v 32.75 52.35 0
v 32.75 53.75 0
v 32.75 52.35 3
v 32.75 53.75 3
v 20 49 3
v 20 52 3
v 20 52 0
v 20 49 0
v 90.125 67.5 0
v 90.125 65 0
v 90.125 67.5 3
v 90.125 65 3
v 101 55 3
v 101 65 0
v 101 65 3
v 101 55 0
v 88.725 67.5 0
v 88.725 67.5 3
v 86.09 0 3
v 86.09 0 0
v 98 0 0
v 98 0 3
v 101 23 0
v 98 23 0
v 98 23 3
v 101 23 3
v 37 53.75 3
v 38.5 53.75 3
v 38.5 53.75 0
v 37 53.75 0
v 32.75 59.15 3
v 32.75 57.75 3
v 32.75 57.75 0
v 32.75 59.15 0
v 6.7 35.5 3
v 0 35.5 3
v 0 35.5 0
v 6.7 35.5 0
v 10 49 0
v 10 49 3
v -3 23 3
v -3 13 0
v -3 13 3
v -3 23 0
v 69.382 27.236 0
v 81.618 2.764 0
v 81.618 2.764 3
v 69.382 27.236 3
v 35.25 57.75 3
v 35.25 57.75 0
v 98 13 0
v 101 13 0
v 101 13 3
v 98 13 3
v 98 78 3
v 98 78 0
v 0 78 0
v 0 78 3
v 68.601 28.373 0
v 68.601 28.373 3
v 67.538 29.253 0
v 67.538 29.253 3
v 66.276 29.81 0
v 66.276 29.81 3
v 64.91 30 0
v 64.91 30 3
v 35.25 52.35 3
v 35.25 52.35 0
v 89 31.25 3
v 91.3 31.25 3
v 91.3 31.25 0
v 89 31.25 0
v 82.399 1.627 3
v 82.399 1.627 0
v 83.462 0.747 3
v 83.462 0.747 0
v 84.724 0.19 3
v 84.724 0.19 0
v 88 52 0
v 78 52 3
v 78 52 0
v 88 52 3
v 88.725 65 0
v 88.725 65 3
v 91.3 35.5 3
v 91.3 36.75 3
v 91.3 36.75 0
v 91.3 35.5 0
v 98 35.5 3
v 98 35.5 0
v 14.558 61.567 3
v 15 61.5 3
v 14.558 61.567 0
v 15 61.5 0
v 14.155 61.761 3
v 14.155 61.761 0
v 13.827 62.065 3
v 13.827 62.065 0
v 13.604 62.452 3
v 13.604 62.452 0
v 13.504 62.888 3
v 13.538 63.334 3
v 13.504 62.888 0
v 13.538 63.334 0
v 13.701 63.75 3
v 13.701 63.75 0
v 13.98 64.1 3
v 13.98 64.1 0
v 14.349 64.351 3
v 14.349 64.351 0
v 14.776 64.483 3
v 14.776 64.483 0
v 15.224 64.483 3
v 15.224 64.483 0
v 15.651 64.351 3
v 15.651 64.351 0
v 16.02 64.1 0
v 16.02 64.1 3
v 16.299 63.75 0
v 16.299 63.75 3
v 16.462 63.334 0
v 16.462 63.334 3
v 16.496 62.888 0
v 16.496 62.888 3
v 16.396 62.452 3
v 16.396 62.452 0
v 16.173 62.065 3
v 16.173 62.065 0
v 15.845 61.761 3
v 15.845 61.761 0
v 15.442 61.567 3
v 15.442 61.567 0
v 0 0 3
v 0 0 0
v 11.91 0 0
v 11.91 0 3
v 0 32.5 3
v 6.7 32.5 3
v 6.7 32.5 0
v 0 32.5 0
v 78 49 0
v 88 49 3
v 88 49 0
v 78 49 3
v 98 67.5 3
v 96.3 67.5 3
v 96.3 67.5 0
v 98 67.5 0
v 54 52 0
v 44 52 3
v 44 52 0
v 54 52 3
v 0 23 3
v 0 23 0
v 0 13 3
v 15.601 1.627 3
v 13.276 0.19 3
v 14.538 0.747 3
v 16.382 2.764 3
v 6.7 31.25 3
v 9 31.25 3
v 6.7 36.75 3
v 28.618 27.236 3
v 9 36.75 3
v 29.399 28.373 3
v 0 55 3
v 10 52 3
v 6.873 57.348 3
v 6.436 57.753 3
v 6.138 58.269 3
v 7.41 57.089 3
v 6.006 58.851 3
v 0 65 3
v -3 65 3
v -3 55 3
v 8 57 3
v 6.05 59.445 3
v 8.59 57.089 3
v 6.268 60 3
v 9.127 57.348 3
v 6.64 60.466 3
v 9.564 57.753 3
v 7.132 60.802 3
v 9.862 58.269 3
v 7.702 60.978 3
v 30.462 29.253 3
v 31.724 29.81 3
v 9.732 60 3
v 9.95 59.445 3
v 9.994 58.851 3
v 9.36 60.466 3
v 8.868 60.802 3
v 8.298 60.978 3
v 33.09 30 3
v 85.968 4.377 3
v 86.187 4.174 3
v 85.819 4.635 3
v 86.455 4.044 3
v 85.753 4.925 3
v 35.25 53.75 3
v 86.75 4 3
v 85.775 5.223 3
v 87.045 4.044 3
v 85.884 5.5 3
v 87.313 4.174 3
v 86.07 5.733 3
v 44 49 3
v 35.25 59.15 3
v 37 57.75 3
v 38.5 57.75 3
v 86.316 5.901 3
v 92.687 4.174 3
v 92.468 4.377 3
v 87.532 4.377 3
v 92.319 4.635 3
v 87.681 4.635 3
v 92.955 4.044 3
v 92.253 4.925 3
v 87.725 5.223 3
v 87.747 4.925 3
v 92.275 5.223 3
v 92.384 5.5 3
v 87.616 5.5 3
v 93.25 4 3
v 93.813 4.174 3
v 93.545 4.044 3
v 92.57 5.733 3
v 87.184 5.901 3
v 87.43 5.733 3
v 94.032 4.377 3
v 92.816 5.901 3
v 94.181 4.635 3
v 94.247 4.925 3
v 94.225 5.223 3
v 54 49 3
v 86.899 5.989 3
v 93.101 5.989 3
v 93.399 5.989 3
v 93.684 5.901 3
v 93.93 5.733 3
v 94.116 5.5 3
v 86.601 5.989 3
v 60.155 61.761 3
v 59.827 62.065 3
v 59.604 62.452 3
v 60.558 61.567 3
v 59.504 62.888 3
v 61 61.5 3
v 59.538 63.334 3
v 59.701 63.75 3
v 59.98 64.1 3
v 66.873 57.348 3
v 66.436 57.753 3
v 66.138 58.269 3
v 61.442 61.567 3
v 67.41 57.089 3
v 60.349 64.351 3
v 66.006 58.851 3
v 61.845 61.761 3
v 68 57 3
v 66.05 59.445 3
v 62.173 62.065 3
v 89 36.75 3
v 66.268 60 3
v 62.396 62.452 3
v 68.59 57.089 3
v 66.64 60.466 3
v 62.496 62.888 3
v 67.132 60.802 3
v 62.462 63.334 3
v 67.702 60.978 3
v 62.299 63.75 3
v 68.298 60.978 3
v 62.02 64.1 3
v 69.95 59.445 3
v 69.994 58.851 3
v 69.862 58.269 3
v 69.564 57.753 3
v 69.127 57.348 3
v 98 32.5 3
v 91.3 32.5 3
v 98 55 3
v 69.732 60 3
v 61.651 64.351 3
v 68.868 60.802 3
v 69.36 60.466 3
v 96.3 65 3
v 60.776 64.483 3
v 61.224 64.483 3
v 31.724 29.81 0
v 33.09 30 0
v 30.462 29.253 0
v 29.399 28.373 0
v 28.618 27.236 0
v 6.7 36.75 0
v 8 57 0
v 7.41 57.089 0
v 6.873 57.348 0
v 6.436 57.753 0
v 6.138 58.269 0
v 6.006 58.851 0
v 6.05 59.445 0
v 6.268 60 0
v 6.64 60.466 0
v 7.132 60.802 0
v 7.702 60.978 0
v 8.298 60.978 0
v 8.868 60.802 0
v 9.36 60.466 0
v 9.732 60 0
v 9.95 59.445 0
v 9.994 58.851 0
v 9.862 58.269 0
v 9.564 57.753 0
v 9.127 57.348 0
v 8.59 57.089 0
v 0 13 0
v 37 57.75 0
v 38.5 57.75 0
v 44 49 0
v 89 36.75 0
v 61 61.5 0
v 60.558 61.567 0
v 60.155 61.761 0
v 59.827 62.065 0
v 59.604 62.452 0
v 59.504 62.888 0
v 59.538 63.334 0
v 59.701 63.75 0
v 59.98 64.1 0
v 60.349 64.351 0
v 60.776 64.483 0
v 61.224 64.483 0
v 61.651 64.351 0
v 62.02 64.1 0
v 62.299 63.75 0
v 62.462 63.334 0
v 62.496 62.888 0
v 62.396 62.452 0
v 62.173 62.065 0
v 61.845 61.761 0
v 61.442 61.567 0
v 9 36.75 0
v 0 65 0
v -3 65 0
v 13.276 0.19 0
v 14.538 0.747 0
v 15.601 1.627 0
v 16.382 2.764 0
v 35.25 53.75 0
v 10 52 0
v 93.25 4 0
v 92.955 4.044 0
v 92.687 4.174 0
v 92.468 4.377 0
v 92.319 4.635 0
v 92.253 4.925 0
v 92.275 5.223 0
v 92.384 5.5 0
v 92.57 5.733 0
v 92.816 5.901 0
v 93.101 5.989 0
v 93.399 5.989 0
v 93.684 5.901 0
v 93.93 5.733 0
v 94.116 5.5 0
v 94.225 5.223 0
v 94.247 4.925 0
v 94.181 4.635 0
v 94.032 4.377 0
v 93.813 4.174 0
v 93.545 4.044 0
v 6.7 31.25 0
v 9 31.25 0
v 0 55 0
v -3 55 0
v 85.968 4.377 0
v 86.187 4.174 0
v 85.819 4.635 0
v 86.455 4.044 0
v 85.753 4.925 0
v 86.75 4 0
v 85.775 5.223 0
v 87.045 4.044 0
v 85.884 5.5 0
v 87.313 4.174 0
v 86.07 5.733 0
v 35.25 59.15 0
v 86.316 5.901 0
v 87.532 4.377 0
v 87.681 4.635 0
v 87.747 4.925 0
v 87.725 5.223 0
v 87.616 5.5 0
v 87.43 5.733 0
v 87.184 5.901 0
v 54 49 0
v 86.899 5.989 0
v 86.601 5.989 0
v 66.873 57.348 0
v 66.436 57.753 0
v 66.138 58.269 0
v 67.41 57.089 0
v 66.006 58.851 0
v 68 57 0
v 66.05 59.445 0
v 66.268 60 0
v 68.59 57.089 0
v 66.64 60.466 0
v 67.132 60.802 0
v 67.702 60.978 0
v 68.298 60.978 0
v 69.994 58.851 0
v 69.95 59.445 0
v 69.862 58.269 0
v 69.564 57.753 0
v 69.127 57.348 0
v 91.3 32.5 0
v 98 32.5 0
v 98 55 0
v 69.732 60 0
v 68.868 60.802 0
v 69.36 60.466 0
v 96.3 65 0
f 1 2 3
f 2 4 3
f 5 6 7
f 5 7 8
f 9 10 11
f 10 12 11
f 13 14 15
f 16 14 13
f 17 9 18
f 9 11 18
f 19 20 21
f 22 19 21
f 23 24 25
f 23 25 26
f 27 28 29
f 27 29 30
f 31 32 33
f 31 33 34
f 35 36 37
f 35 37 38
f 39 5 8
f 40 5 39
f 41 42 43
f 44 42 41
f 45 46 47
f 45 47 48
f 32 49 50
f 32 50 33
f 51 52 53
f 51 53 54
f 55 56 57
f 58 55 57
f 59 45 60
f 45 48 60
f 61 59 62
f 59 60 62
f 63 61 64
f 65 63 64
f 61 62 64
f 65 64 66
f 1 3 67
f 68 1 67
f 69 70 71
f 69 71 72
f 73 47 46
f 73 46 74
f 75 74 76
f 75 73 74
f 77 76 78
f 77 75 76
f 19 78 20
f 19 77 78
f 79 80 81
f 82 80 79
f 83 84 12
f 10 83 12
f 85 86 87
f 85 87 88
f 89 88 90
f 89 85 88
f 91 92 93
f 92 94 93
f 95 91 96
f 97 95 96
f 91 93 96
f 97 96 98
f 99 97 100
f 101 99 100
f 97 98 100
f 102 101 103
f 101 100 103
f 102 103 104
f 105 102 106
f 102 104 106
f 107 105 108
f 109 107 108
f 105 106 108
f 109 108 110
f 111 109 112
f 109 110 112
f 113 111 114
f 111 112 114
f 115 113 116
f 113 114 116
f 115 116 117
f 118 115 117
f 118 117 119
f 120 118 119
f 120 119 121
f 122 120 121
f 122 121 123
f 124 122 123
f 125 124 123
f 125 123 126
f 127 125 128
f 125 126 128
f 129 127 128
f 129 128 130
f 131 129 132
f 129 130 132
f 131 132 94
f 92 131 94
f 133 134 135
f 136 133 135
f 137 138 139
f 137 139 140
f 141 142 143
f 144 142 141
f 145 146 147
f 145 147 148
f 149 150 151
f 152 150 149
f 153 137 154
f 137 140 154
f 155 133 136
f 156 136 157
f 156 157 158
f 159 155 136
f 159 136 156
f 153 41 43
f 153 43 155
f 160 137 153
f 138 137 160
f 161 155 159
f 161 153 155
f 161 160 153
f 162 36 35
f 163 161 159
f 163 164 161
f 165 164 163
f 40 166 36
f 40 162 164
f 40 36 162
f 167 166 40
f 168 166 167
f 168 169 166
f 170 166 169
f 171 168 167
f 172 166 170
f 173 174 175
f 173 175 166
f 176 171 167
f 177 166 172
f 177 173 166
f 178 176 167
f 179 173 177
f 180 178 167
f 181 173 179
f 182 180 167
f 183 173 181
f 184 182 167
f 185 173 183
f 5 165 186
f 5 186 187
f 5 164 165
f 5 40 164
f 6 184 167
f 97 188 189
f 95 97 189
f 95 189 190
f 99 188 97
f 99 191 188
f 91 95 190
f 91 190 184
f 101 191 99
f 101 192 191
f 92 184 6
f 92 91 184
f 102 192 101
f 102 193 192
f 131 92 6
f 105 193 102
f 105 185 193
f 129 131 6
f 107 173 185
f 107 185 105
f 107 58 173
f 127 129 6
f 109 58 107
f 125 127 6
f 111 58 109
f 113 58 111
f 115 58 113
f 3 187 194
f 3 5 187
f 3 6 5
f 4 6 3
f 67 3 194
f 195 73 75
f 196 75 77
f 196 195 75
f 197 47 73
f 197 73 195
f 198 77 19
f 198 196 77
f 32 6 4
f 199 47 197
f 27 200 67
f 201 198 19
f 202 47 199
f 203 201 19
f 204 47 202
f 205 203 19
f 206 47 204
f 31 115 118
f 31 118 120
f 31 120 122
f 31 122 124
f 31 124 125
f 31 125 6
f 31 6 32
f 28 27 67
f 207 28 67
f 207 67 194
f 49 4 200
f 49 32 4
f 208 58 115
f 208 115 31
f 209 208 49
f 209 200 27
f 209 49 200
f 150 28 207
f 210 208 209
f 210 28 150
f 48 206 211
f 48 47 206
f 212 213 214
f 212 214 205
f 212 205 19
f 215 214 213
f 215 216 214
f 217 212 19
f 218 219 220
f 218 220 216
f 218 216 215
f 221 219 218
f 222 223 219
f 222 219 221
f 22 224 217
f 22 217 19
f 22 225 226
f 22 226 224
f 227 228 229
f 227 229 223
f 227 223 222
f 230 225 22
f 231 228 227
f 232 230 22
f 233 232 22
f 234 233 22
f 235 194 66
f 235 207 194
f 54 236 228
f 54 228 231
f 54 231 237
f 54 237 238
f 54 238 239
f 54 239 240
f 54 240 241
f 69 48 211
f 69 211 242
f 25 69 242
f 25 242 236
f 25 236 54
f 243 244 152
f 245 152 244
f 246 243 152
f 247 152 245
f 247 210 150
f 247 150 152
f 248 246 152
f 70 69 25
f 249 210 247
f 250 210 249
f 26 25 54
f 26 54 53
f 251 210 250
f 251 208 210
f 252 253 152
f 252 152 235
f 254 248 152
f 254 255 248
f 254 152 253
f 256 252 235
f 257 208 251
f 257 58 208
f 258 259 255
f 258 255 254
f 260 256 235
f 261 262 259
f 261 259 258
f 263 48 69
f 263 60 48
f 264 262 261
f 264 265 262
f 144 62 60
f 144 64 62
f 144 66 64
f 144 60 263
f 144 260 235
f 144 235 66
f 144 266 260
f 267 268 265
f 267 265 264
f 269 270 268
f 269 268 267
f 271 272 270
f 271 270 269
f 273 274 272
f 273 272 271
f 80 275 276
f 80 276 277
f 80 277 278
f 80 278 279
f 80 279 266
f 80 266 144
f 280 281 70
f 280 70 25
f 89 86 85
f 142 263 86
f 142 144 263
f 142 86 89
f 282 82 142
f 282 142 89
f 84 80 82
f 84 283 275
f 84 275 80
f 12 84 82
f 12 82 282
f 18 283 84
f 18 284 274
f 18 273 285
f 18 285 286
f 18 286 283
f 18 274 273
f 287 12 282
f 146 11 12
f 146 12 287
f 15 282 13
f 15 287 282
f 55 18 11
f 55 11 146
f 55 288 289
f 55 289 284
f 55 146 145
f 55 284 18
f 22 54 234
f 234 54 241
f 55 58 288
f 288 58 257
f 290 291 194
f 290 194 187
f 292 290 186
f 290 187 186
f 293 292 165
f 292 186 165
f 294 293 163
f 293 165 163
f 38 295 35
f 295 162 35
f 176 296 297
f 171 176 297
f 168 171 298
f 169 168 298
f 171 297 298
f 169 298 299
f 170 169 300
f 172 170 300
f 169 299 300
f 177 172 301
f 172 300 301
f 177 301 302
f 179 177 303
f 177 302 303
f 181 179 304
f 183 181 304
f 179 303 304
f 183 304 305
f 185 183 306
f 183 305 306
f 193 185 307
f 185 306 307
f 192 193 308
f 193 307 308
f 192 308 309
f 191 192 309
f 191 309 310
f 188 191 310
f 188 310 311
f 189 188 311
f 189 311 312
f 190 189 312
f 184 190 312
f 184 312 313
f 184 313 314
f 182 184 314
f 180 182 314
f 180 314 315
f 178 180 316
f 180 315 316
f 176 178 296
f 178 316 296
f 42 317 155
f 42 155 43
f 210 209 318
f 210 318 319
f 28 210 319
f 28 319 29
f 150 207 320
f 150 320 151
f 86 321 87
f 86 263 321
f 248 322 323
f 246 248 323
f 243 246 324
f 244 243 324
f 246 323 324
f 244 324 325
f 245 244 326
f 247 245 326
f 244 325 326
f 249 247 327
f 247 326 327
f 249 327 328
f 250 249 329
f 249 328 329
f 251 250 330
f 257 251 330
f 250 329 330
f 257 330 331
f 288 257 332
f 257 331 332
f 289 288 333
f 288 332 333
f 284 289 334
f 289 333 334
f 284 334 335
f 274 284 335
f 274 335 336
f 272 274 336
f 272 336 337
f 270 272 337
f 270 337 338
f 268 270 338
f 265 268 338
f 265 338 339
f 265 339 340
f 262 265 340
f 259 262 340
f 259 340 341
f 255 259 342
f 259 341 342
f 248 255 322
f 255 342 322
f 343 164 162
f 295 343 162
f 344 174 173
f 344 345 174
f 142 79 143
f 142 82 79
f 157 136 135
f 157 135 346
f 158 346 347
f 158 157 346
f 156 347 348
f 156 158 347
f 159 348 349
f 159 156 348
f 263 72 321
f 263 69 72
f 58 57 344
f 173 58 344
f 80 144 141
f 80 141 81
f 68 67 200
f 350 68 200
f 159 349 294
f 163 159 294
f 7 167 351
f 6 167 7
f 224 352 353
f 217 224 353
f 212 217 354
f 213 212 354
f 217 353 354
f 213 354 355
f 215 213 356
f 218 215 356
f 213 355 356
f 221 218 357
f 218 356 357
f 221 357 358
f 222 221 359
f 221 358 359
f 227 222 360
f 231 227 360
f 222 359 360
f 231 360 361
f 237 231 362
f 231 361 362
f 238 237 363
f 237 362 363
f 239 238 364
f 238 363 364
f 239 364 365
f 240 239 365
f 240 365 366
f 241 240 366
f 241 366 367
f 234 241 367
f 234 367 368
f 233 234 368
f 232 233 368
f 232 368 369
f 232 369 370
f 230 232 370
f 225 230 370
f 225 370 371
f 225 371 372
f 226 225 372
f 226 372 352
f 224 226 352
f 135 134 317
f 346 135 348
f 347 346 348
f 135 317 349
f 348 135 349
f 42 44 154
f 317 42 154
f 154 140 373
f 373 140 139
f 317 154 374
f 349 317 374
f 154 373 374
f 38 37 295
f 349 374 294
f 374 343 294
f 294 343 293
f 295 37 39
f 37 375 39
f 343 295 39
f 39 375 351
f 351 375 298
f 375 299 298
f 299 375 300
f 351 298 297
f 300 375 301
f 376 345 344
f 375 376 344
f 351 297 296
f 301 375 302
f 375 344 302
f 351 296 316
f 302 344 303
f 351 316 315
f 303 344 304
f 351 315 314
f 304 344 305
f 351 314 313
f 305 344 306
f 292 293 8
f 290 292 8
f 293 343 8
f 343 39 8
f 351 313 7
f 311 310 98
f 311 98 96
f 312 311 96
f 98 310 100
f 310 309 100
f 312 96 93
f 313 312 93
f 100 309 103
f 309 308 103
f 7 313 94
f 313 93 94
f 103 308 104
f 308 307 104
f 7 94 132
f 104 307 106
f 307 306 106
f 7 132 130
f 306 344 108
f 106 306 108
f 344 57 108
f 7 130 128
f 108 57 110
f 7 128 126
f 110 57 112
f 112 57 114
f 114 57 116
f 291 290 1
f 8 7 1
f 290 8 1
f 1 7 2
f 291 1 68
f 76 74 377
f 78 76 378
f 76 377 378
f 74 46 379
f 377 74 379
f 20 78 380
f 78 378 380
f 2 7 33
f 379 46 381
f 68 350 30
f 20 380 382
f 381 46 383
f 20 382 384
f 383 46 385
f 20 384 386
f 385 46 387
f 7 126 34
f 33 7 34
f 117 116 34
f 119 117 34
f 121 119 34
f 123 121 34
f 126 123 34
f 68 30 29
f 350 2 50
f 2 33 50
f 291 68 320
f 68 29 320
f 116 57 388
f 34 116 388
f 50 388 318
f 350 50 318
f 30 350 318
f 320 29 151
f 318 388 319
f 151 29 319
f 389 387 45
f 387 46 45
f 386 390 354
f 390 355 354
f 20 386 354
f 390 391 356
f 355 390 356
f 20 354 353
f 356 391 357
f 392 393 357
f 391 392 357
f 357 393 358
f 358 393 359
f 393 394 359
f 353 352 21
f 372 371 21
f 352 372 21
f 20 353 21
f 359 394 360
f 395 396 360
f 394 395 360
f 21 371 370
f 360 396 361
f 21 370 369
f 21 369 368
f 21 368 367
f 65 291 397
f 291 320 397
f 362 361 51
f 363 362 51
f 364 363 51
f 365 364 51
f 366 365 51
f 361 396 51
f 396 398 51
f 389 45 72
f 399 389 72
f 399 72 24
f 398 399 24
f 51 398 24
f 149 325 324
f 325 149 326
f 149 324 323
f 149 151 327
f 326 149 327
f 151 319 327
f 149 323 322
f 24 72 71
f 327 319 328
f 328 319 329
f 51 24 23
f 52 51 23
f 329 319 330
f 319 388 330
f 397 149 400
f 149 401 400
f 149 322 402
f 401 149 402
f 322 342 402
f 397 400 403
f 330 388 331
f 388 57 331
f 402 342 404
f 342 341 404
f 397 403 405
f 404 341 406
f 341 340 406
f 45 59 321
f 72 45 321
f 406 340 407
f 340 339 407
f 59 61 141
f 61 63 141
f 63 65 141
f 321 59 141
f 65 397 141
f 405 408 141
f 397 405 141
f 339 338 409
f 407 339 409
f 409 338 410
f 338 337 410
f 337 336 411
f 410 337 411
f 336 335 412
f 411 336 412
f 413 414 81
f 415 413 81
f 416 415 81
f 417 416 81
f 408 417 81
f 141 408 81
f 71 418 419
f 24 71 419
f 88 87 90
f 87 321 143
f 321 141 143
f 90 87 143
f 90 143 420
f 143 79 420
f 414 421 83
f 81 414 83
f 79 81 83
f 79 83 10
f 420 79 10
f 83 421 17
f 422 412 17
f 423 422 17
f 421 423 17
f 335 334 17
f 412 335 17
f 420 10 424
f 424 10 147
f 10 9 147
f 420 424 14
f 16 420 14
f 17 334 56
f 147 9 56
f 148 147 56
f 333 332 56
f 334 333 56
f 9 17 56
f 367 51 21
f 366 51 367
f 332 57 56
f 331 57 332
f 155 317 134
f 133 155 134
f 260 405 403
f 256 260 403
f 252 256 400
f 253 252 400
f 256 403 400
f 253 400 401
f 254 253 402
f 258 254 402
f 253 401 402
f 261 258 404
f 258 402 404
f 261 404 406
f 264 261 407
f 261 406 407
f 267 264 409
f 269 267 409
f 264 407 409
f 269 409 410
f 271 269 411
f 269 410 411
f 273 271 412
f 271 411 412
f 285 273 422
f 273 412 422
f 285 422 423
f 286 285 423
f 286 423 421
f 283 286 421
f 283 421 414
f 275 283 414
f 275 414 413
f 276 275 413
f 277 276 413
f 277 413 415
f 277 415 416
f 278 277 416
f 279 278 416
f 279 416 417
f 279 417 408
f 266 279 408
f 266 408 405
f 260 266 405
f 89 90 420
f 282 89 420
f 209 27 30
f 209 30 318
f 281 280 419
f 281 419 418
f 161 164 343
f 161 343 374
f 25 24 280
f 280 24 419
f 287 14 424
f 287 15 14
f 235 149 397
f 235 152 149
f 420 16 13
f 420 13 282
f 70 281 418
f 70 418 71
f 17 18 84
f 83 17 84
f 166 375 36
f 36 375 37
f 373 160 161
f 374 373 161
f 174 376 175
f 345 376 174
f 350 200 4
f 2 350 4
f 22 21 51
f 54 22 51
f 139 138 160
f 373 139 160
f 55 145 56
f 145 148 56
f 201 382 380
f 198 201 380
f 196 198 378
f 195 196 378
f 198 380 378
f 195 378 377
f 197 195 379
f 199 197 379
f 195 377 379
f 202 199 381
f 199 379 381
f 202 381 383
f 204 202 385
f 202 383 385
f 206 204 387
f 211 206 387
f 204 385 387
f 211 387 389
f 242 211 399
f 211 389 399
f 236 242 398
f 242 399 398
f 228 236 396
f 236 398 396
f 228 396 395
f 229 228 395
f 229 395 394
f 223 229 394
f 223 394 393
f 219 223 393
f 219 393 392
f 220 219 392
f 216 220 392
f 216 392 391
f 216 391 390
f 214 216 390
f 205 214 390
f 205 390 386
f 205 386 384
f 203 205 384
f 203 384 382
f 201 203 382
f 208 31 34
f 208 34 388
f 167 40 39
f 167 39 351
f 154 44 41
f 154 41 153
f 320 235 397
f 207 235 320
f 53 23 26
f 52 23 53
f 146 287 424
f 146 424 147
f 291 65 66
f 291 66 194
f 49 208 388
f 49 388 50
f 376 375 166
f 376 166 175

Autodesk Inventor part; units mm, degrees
ref_plane "YZ Plane" through (0, 0, 0) normal (1, 0, 0) x (0, 1, 0)
ref_plane "XZ Plane" through (0, 0, 0) normal (0, 1, 0) x (-1, 0, 0)
ref_plane "XY Plane" through (0, 0, 0) normal (0, 0, 1) x (1, 0, 0)
sketch "Sketch1" plane through (0, 0, 0) normal (0, 0, 1) x (1, 0, 0)
  line L0 (0, 0) -> (98, 0)
  line L1 (98, 0) -> (98, 78)
  line L2 (98, 78) -> (0, 78)
  line L3 (0, 78) -> (0, 0)
  line L4 (-3, 65) -> (101, 65)
  line L5 (101, 65) -> (101, 55)
  line L6 (101, 55) -> (-3, 55)
  line L7 (-3, 55) -> (-3, 65)
  line L8 (101, 23) -> (101, 13)
  line L9 (-3, 13) -> (-3, 23)
  line L10 (68, 30) -> (30, 30)
  line L11 (15, 0) -> (30, 30)
  line L12 (83, 0) -> (68, 30)
  line L13 (15, 0) -> (83, 0)
  line L14 (-3, 23) -> (0, 23)
  line L15 (98, 23) -> (101, 23)
  line L16 (101, 13) -> (98, 13)
  line L17 (0, 13) -> (-3, 13)
  dimension "d0" = 98
  dimension "d1" = 78
  dimension "d171" = 104
  dimension "d172" = 3
  dimension "d173" = 10
  dimension "d174" = 13
  dimension "d175" = 10
  dimension "d177" = 3
  dimension "d181" = 30
  dimension "d182" = 30
  dimension "d183" = 30
  dimension "d184" = 15
  dimension "d185" = 15
  dimension "d186" = 10
  dimension "d187" = 13
  dimension "d188" = 13
extrude "Extrusion1" add sketch "Sketch1" along normal blind 3 contours L3 L6 L1 L0 L12 L10 L11 | L17 L9 L14 L3 | L6 L7 L4 L3 | L3 L4 L1 L6 | L1 L15 L8 L16 | L3 L2 L1 L4 | L1 L4 L5 L6
fillet "圓角4" radius 5 4 edges at (15, 0, 1.5) (30, 30, 1.5) (68, 30, 1.5) (83, 0, 1.5)
sketch "草圖13" plane through (0, 0, 3) normal (0, 0, 1) x (1, 0, 0)
  line L0 (98, 55) -> (98, 23) projected
  line L1 (0, 78) -> (98, 78) projected
  line L2 (0, 65) -> (0, 78) projected
  line L3 (0, 23) -> (0, 55) projected
  line L4 (10, 52) -> (20, 52)
  line L5 (20, 52) -> (20, 49)
  line L6 (20, 49) -> (10, 49)
  line L7 (10, 49) -> (10, 52)
  line L8 (44, 52) -> (54, 52)
  line L9 (54, 52) -> (54, 49)
  line L10 (54, 49) -> (44, 49)
  line L11 (44, 49) -> (44, 52)
  line L12 (78, 52) -> (88, 52)
  line L13 (88, 52) -> (88, 49)
  line L14 (88, 49) -> (78, 49)
  line L15 (78, 49) -> (78, 52)
  dimension "d190" = 10
  dimension "d191" = 10
  dimension "d192" = 3
  dimension "d193" = 26
  dimension "d194" = 10
  dimension "d195" = 10
  dimension "d196" = 10
  dimension "d198" = 44
extrude "擠出6" cut sketch "草圖13" against normal through all
sketch "草圖14" plane through (0, 0, 3) normal (0, 0, 1) x (1, 0, 0)
  line L0 (0, 78) -> (98, 78) projected
  line L1 (0, 65) -> (0, 78) projected
  point P0 (8, 59)
  point P1 (68, 59)
  dimension "d201" = 8
  dimension "d202" = 19
  dimension "d203" = 60
hole "孔5" at (8, 59, 3) at (68, 59, 3) direction (0, 0, -1) diameter 4 end through all
sketch "草圖15" plane through (0, 0, 3) normal (0, 0, 1) x (1, 0, 0)
  line L0 (0, 78) -> (98, 78) projected
  line L1 (0, 65) -> (0, 78) projected
  point P0 (15, 63)
  point P1 (61, 63)
  dimension "d211" = 15
  dimension "d212" = 15
  dimension "d213" = 46
hole "孔6" at (15, 63, 3) at (61, 63, 3) direction (0, 0, -1) diameter 3 end through all
sketch "草圖16" plane through (0, 0, 3) normal (0, 0, 1) x (1, 0, 0)
  line L0 (98, 0) -> (86.0902, 0) projected
  line L1 (98, 13) -> (98, 0) projected
  point P0 (93.25, 5)
  point P1 (86.75, 5)
  dimension "d221" = 5
  dimension "d222" = 4.75
  dimension "d223" = 6.5
hole "孔7" at (93.25, 5, 3) at (86.75, 5, 3) direction (0, 0, -1) diameter 2 end through all
sketch "草圖17" plane through (0, 0, 3) normal (0, 0, 1) x (1, 0, 0)
  line L0 (98, 55) -> (98, 23) projected
  line L1 (0, 23) -> (0, 55) projected
  line L2 (11.9098, 0) -> (0, 0) projected
  line L3 (0, 35.5) -> (9, 35.5)
  line L4 (9, 35.5) -> (9, 32.5)
  line L5 (9, 32.5) -> (0, 32.5)
  line L6 (0, 32.5) -> (0, 35.5)
  line L7 (9, 36.75) -> (6.7, 36.75)
  line L8 (6.7, 36.75) -> (6.7, 31.25)
  line L9 (6.7, 31.25) -> (9, 31.25)
  line L10 (9, 31.25) -> (9, 36.75)
  line L11 (89, 35.5) -> (98, 35.5)
  line L12 (98, 35.5) -> (98, 32.5)
  line L13 (98, 32.5) -> (89, 32.5)
  line L14 (89, 32.5) -> (89, 35.5)
  line L15 (89, 36.75) -> (91.3, 36.75)
  line L16 (91.3, 36.75) -> (91.3, 31.25)
  line L17 (91.3, 31.25) -> (89, 31.25)
  line L18 (89, 31.25) -> (89, 36.75)
  dimension "d231" = 9
  dimension "d233" = 3
  dimension "d234" = 32.5
  dimension "d235" = 2.3
  dimension "d236" = 5.5
  dimension "d237" = 1.25
  dimension "d239" = 9
  dimension "d240" = 2.3
extrude "擠出7" cut sketch "草圖17" against normal through all
sketch "草圖18" plane through (0, 0, 3) normal (0, 0, 1) x (1, 0, 0)
  line L0 (0, 35.5) -> (0, 55) projected
  line L1 (10, 52) -> (20, 52) projected
  line L2 (37, 57.75) -> (38.5, 57.75)
  line L3 (38.5, 57.75) -> (38.5, 53.75)
  line L4 (38.5, 53.75) -> (37, 53.75)
  line L5 (37, 53.75) -> (37, 57.75)
  line L6 (35.25, 57.75) -> (32.75, 57.75)
  line L7 (32.75, 57.75) -> (32.75, 59.15)
  line L8 (32.75, 59.15) -> (35.25, 59.15)
  line L9 (35.25, 59.15) -> (35.25, 57.75)
  line L10 (35.25, 53.75) -> (32.75, 53.75)
  line L11 (32.75, 53.75) -> (32.75, 52.35)
  line L12 (32.75, 52.35) -> (35.25, 52.35)
  line L13 (35.25, 52.35) -> (35.25, 53.75)
  line L14 (98, 65) -> (96.3, 65)
  line L15 (96.3, 65) -> (96.3, 67.5)
  line L16 (96.3, 67.5) -> (98, 67.5)
  line L17 (98, 67.5) -> (98, 65)
  line L18 (90.125, 67.5) -> (88.725, 67.5)
  line L19 (88.725, 67.5) -> (88.725, 65)
  line L20 (88.725, 65) -> (90.125, 65)
  line L21 (90.125, 65) -> (90.125, 67.5)
  dimension "d243" = 37
  dimension "d244" = 1.75
  dimension "d245" = 4
  dimension "d246" = 1.5
  dimension "d247" = 2.5
  dimension "d248" = 1.4
  dimension "d249" = 1.75
  dimension "d250" = 1.4
  dimension "d254" = 1.7
  dimension "d255" = 2.5
  dimension "d256" = 1.4
  dimension "d257" = 6.175
extrude "擠出8" cut sketch "草圖18" against normal through all
properties part number "plastic_part_1"
